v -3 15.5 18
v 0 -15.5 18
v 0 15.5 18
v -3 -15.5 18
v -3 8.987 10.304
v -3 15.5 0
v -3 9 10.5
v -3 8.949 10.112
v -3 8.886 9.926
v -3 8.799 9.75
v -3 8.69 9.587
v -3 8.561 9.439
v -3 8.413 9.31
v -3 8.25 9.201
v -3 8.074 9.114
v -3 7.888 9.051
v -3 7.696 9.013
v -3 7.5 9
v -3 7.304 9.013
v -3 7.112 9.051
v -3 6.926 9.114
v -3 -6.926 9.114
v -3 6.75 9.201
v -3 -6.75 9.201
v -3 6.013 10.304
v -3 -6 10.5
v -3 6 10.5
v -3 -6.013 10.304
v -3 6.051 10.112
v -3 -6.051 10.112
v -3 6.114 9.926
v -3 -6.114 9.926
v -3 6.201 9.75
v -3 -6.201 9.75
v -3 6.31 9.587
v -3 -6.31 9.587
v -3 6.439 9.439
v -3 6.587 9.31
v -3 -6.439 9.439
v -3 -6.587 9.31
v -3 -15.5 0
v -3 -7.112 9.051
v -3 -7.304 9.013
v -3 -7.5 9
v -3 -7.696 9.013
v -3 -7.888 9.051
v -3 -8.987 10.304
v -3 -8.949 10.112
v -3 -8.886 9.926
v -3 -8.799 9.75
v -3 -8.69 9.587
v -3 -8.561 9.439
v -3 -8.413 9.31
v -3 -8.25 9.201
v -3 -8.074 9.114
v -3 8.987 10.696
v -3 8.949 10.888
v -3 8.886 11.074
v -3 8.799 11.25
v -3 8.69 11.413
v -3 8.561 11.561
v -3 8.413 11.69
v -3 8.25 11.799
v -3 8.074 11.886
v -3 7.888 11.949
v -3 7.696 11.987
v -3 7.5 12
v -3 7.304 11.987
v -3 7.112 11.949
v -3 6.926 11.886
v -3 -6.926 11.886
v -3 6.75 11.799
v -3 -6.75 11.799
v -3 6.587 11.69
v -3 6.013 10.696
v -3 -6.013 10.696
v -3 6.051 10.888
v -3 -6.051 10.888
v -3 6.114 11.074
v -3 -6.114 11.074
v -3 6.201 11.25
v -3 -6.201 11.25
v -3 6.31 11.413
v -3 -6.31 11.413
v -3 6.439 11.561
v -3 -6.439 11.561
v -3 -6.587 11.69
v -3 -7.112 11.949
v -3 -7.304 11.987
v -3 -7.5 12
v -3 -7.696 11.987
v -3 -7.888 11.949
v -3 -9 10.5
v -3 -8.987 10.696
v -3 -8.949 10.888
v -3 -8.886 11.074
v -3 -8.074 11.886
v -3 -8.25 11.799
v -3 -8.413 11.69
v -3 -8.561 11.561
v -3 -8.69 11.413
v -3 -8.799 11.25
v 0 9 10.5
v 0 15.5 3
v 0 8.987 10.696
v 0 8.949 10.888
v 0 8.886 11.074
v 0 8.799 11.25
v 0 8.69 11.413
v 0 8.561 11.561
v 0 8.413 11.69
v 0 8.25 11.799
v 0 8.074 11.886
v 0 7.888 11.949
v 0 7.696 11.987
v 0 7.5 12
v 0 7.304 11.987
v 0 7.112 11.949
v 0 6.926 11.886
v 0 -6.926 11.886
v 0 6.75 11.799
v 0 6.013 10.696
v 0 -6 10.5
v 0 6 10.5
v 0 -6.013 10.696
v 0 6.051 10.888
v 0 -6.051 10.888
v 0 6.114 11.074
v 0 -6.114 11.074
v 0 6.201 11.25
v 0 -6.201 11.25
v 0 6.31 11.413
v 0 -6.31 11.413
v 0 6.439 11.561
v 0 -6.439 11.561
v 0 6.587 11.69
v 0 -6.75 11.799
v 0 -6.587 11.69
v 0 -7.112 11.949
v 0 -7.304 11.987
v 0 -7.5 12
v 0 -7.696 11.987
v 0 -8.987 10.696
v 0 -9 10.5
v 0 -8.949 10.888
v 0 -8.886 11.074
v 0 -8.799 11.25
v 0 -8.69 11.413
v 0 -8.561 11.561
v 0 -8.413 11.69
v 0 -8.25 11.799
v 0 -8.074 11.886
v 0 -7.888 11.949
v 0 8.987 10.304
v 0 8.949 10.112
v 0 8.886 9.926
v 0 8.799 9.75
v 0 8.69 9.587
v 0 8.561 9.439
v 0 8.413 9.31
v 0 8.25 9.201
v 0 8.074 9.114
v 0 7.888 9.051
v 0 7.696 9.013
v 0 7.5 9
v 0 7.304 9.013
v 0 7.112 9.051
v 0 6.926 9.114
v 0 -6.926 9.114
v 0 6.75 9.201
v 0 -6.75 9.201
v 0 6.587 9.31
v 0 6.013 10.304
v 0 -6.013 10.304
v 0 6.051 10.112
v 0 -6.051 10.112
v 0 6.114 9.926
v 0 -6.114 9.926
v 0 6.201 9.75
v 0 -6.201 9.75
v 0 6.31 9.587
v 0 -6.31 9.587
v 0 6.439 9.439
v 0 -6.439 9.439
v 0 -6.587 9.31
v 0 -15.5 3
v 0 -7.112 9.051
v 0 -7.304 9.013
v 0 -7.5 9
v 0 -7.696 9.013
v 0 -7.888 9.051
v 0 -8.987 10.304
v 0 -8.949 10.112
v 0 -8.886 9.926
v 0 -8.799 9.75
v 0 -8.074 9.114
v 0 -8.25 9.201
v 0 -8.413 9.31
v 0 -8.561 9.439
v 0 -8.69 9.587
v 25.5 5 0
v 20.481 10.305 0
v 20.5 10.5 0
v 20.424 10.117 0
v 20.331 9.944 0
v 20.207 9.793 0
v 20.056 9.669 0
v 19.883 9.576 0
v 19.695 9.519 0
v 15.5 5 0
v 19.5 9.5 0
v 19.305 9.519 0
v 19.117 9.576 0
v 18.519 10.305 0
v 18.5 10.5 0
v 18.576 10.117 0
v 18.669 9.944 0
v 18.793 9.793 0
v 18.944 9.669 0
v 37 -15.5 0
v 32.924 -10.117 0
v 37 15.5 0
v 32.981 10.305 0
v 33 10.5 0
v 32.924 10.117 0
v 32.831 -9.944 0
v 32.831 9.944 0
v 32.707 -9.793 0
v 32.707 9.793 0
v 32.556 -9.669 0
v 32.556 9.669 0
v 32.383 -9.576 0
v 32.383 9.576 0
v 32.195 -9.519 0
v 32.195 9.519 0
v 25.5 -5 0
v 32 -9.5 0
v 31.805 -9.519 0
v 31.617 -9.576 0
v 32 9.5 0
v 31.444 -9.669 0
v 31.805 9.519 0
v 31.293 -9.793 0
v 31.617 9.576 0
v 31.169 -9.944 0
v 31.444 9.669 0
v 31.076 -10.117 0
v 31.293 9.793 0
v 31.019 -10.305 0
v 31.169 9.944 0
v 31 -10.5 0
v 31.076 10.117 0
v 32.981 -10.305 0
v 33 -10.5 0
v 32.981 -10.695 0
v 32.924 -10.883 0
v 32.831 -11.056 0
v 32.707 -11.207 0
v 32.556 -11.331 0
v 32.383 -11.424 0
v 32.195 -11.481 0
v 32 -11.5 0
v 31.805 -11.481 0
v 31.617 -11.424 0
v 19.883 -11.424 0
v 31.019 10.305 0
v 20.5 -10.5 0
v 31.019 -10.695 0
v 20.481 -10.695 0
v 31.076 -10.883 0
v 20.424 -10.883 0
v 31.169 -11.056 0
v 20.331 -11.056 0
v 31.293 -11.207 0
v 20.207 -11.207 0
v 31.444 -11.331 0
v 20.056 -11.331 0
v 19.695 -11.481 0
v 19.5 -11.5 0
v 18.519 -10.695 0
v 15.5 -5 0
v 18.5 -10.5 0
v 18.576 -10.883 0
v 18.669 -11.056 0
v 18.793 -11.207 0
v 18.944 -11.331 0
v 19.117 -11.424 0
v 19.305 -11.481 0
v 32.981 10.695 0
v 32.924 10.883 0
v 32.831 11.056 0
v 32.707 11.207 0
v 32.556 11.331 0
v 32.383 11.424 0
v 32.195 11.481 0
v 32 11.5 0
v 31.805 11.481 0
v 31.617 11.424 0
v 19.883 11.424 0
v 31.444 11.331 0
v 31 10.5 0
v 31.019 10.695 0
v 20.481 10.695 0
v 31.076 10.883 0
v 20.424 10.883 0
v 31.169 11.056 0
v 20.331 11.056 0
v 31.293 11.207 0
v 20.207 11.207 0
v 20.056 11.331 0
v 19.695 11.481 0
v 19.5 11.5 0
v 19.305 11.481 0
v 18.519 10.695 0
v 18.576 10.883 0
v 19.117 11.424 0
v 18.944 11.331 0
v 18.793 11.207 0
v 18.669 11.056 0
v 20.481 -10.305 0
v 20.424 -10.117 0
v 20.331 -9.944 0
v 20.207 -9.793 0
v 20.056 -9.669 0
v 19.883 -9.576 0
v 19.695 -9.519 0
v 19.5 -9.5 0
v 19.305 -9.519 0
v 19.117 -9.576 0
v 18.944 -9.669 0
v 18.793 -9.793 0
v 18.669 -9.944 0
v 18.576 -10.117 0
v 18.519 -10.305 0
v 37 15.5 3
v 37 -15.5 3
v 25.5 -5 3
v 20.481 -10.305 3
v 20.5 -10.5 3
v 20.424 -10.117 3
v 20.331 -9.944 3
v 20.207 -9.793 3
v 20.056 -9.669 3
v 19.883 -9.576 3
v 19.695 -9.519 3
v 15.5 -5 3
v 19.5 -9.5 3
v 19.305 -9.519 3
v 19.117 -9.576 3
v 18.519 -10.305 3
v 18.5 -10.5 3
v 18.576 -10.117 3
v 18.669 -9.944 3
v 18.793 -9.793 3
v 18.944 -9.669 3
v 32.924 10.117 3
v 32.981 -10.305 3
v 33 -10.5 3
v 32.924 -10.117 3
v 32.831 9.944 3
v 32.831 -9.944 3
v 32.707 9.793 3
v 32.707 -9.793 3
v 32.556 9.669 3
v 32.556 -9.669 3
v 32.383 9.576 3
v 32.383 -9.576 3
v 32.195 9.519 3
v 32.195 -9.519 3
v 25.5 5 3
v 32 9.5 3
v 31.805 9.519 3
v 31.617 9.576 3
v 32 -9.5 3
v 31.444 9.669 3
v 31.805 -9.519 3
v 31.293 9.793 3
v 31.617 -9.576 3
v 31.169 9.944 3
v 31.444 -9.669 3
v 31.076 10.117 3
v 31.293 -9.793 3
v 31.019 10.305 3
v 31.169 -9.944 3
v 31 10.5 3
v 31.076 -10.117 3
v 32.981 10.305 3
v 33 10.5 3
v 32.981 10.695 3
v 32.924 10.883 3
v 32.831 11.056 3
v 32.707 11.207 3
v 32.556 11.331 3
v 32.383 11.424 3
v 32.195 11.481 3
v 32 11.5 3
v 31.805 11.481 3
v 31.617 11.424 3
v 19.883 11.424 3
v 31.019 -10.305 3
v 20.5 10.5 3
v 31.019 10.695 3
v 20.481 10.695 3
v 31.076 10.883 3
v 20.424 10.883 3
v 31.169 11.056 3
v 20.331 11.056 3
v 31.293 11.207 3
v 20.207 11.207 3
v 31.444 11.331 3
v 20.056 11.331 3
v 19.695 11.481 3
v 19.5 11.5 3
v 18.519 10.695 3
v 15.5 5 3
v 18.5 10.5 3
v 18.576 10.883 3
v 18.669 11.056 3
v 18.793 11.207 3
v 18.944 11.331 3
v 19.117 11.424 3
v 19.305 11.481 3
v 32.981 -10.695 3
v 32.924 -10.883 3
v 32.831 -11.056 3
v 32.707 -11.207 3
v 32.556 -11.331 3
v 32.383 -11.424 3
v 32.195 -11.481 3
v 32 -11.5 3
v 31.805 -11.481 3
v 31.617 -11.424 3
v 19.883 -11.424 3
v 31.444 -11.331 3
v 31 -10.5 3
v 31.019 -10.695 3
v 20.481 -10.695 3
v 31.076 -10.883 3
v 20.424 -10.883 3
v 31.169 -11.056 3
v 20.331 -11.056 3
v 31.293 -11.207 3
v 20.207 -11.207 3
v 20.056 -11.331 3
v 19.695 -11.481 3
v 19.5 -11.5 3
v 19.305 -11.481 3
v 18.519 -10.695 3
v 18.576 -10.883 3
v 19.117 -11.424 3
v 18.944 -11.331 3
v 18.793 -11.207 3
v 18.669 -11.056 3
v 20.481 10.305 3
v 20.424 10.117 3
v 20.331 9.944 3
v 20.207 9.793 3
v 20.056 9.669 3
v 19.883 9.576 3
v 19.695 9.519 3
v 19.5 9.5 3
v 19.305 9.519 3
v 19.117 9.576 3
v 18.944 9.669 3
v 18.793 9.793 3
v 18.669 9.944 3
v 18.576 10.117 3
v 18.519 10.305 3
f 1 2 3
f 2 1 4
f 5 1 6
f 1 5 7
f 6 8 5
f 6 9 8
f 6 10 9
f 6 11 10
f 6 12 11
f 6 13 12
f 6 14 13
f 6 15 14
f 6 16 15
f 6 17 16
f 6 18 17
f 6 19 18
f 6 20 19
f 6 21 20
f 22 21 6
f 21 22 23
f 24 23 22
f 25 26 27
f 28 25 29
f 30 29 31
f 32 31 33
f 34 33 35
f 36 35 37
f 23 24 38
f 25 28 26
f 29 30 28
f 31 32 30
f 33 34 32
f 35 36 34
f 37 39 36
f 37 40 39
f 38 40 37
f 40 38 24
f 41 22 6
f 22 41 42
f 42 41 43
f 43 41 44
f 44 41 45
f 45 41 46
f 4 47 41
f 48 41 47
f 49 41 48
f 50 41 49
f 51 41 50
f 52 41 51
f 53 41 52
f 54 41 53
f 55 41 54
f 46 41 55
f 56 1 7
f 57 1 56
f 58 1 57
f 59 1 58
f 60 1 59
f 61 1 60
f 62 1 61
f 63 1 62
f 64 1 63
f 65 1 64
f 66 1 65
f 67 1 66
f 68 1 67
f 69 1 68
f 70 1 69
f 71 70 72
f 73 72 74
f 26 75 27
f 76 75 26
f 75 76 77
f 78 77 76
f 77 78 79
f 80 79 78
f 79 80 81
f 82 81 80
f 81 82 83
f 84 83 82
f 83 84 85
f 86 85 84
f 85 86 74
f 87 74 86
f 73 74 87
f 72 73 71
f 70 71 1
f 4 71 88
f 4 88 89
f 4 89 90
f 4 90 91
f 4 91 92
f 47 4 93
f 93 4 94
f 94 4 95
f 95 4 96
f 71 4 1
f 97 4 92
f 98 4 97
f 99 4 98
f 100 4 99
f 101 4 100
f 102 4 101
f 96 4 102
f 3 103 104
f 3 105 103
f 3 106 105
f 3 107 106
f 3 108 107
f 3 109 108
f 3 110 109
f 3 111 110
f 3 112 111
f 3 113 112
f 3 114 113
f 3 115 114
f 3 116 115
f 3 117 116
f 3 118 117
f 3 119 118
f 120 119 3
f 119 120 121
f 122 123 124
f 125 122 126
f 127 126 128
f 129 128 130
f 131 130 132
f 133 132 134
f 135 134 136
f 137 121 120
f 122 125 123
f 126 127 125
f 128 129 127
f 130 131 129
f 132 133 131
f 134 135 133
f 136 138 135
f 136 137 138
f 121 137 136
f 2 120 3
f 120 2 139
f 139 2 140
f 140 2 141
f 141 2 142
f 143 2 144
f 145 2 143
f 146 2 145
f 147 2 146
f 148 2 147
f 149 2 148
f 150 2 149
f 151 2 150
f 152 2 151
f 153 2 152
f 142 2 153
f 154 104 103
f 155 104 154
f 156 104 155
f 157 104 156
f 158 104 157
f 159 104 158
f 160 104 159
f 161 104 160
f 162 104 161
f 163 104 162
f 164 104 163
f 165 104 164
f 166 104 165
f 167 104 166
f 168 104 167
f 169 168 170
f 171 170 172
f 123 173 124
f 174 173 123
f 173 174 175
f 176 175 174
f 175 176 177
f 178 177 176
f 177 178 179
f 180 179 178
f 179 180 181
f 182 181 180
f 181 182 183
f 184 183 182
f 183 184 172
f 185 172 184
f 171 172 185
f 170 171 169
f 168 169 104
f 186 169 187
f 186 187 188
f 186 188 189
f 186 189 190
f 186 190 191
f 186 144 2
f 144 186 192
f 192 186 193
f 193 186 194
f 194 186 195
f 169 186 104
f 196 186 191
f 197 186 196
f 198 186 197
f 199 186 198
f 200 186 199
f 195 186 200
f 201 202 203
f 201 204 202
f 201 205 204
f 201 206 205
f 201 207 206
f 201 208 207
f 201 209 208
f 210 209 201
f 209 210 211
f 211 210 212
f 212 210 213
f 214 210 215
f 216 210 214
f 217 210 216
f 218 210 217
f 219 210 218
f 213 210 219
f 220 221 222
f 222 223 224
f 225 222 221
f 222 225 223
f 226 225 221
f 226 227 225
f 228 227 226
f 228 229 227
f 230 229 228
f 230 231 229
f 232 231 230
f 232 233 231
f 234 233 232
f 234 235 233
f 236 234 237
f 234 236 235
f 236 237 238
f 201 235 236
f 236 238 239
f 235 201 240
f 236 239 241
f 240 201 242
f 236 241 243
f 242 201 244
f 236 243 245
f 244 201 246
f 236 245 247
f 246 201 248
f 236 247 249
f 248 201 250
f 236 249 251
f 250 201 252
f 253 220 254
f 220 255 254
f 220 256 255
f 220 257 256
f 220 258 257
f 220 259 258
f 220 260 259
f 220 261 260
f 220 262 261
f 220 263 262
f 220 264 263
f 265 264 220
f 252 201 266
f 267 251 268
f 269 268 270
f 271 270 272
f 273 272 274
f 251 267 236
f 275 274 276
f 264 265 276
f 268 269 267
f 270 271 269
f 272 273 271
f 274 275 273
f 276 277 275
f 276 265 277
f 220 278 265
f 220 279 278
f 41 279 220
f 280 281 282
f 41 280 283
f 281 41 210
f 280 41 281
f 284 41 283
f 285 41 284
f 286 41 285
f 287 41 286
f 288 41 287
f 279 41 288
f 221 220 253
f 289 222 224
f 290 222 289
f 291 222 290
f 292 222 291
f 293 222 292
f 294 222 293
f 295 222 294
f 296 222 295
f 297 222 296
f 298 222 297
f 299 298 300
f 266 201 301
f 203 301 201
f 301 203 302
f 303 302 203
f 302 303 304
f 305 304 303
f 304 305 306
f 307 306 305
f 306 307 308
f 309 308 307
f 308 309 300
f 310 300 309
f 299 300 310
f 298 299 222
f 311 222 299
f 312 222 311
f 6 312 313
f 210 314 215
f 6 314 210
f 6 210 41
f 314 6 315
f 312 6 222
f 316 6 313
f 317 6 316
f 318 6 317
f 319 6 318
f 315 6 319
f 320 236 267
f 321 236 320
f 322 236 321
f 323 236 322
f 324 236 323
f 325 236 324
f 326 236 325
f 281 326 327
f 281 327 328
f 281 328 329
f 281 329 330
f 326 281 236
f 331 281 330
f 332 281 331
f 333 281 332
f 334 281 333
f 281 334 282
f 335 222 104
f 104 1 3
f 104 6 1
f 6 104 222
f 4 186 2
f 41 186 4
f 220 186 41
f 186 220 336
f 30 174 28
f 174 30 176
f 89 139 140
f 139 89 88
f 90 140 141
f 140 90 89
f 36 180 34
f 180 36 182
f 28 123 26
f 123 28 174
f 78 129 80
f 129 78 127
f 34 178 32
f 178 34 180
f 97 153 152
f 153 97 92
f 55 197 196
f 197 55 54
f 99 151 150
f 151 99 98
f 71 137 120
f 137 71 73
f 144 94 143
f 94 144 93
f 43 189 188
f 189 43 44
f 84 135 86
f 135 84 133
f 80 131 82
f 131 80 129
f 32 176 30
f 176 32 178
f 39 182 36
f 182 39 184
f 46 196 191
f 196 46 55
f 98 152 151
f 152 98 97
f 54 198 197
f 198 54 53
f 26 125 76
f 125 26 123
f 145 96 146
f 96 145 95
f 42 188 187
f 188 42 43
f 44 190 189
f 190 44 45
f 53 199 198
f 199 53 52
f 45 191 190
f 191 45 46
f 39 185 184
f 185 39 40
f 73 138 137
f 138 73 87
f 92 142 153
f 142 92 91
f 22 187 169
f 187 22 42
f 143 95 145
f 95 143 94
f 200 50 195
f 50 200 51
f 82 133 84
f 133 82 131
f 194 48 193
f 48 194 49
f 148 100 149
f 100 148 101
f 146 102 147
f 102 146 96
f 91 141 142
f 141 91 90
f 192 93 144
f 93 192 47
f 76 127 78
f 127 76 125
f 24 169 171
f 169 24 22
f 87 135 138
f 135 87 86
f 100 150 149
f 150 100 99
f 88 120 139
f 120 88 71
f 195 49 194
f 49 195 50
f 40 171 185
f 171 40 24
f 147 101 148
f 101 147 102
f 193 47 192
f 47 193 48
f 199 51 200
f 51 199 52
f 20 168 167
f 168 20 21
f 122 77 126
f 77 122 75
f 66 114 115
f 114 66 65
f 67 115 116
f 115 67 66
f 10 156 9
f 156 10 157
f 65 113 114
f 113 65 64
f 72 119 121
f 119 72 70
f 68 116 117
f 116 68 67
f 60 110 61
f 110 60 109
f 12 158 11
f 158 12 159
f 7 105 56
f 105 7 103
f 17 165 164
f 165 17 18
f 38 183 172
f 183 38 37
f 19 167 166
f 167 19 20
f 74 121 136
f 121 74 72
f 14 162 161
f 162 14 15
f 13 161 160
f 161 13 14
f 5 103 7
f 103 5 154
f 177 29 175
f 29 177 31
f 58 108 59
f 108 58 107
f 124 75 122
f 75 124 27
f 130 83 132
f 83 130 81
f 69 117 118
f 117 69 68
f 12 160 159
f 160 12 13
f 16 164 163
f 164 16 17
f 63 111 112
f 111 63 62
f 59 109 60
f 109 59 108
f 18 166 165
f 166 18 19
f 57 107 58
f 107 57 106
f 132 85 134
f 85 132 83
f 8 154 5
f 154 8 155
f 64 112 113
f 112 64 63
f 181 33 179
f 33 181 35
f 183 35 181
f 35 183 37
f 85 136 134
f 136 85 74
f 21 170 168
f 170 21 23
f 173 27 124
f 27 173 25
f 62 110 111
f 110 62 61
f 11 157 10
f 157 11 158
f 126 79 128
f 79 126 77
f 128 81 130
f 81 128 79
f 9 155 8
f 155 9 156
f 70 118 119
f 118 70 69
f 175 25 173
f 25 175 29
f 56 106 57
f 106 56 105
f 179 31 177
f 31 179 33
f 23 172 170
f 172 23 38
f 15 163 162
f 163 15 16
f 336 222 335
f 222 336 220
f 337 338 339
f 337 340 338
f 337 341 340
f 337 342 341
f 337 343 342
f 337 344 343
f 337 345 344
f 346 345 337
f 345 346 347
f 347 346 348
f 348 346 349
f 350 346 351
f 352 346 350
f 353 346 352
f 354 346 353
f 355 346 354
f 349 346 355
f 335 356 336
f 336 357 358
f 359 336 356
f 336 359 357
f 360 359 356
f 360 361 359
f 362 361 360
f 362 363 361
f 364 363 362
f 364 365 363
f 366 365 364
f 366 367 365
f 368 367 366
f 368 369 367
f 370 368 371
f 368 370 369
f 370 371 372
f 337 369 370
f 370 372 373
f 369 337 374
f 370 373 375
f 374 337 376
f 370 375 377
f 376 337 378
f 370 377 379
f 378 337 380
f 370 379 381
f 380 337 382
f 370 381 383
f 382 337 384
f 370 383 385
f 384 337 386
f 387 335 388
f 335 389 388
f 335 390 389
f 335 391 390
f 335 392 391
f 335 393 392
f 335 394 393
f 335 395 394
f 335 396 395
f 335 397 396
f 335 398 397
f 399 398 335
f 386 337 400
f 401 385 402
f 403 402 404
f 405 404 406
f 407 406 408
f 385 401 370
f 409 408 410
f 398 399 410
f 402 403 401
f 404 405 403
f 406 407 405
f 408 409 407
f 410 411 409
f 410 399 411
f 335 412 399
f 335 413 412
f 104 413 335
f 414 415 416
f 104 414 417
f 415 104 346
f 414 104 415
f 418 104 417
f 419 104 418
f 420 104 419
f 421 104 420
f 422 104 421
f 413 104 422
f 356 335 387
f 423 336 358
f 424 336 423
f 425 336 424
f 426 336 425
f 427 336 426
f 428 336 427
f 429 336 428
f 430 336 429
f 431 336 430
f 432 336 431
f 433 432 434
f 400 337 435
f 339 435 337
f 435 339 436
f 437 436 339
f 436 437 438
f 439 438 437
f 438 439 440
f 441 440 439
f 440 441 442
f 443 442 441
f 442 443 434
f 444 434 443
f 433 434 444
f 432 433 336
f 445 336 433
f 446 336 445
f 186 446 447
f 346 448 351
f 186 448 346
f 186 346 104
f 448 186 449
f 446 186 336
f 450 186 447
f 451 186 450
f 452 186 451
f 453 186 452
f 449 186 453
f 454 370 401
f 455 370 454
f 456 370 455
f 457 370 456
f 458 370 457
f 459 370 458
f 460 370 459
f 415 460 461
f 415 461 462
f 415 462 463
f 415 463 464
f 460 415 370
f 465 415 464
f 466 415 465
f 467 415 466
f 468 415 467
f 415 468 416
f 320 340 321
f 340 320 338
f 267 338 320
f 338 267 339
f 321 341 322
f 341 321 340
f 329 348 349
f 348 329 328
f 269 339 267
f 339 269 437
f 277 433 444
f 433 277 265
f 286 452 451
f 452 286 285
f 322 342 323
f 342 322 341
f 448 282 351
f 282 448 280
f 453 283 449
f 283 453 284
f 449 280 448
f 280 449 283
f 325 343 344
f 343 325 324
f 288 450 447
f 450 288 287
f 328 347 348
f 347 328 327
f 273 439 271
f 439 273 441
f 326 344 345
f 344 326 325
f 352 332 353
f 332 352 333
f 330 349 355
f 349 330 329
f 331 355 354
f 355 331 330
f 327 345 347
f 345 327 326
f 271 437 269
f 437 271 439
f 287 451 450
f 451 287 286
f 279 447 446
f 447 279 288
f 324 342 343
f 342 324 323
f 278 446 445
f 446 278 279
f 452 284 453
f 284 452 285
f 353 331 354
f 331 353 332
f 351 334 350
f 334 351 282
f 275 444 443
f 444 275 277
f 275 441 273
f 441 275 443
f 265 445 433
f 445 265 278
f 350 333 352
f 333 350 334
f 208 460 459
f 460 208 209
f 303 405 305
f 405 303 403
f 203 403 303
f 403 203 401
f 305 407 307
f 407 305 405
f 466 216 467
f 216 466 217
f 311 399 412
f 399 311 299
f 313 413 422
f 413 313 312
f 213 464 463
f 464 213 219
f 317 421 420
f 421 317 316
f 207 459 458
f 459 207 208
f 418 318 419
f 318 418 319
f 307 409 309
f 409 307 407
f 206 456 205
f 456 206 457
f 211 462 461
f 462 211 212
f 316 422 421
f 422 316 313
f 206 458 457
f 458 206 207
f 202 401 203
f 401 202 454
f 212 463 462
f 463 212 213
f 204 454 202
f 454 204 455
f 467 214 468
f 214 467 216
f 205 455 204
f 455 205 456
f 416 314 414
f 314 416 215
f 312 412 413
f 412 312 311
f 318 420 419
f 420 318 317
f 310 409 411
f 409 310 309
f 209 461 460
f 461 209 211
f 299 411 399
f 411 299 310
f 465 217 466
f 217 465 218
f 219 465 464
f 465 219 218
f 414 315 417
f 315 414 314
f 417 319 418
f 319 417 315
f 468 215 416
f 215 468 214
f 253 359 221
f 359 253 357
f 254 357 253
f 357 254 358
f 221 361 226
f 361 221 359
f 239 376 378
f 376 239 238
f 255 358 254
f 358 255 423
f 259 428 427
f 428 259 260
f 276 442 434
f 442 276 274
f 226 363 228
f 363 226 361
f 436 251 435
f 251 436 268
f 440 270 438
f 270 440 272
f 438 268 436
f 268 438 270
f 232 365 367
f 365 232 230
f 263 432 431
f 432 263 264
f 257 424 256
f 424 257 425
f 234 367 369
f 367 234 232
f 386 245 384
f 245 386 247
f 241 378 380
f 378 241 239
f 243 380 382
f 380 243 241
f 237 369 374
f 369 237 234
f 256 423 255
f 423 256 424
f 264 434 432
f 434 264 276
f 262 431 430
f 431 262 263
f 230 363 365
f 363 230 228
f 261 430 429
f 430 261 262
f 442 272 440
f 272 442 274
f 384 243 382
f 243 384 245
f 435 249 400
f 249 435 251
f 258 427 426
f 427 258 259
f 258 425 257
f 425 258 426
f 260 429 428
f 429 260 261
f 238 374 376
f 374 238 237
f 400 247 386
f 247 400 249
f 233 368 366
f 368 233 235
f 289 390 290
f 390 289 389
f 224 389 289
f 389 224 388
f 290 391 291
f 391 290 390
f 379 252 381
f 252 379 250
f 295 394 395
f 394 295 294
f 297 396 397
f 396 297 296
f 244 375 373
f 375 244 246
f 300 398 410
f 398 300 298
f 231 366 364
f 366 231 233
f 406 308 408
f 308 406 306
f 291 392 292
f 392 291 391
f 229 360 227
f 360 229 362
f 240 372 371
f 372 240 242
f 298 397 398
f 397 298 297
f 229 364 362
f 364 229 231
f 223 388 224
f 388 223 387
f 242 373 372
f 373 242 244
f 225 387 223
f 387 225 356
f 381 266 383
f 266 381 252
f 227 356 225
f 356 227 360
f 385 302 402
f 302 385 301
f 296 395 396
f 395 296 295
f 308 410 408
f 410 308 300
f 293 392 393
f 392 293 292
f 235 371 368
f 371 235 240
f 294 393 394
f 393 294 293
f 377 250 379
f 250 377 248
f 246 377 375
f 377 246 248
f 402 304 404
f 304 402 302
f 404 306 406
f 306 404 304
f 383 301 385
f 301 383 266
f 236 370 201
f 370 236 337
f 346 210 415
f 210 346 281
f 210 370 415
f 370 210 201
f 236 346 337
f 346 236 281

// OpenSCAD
// A Raspberry Pi camera mount.

$fs = .2;
$fa = 5;

// Dimensions of the camera board.
cameraWidth = 25;
cameraHeight = 24;
aperatureWidth = 8;
aperatureYOffset = 5.5;
cameraBoardThickness = 1;

holeYOffset = 9.5;
holeXSpacing = 21;
holeYSpacing = 12.5;
holeDiameter = 2;

mountMargin = 3;
mountBottomMargin = 10; // To accommodate the cable.
mountWidth = cameraWidth + 2*mountMargin;
mountHeight = cameraHeight + mountMargin + mountBottomMargin;

mountThickness = 3;

baseWidth = 15;
mountingHoleSpacing = 15;
mountingHoleDiameter = 3;

aperatureMargin = 1;

maxModelSize = 30;

// The camera board.
%translate([mountBottomMargin, -cameraWidth/2, mountThickness])
cube(size=[cameraHeight, cameraWidth, cameraBoardThickness]);

// The mount base.
rotate([0, -90, 0])
difference() {
  translate([0, -mountWidth/2, 0])
  cube(size=[baseWidth + mountThickness, mountWidth, mountThickness]);
  
  translate([baseWidth/2 + mountThickness, -mountingHoleSpacing/2, 0])
  cylinder(d=mountingHoleDiameter, h=2*maxModelSize, center=true);
  
  translate([baseWidth/2 + mountThickness, mountingHoleSpacing/2, 0])
  cylinder(d=mountingHoleDiameter, h=2*maxModelSize, center=true);
}

// The main part of the mount.
difference() {
  translate([0, -mountWidth/2, 0])
  cube(size=[cameraHeight + mountMargin + mountBottomMargin,
             cameraWidth + 2*mountMargin,
             mountThickness]);
  
  translate([holeYOffset + mountBottomMargin, -holeXSpacing/2, 0])
  cylinder(d=holeDiameter, h=2*maxModelSize, center=true);
  
  translate([holeYOffset + mountBottomMargin, holeXSpacing/2, 0])
  cylinder(d=holeDiameter, h=2*maxModelSize, center=true);
  
  translate([holeYOffset + holeYSpacing + mountBottomMargin, -holeXSpacing/2, 0])
  cylinder(d=holeDiameter, h=2*maxModelSize, center=true);
  
  translate([holeYOffset + holeYSpacing + mountBottomMargin, holeXSpacing/2, 0])
  cylinder(d=holeDiameter, h=2*maxModelSize, center=true);
  
  translate([mountBottomMargin + aperatureYOffset,
              -aperatureWidth/2 - aperatureMargin,
              -maxModelSize])
  cube(size=[aperatureWidth + 2*aperatureMargin,
             aperatureWidth + 2*aperatureMargin,
             2*maxModelSize]);
}
